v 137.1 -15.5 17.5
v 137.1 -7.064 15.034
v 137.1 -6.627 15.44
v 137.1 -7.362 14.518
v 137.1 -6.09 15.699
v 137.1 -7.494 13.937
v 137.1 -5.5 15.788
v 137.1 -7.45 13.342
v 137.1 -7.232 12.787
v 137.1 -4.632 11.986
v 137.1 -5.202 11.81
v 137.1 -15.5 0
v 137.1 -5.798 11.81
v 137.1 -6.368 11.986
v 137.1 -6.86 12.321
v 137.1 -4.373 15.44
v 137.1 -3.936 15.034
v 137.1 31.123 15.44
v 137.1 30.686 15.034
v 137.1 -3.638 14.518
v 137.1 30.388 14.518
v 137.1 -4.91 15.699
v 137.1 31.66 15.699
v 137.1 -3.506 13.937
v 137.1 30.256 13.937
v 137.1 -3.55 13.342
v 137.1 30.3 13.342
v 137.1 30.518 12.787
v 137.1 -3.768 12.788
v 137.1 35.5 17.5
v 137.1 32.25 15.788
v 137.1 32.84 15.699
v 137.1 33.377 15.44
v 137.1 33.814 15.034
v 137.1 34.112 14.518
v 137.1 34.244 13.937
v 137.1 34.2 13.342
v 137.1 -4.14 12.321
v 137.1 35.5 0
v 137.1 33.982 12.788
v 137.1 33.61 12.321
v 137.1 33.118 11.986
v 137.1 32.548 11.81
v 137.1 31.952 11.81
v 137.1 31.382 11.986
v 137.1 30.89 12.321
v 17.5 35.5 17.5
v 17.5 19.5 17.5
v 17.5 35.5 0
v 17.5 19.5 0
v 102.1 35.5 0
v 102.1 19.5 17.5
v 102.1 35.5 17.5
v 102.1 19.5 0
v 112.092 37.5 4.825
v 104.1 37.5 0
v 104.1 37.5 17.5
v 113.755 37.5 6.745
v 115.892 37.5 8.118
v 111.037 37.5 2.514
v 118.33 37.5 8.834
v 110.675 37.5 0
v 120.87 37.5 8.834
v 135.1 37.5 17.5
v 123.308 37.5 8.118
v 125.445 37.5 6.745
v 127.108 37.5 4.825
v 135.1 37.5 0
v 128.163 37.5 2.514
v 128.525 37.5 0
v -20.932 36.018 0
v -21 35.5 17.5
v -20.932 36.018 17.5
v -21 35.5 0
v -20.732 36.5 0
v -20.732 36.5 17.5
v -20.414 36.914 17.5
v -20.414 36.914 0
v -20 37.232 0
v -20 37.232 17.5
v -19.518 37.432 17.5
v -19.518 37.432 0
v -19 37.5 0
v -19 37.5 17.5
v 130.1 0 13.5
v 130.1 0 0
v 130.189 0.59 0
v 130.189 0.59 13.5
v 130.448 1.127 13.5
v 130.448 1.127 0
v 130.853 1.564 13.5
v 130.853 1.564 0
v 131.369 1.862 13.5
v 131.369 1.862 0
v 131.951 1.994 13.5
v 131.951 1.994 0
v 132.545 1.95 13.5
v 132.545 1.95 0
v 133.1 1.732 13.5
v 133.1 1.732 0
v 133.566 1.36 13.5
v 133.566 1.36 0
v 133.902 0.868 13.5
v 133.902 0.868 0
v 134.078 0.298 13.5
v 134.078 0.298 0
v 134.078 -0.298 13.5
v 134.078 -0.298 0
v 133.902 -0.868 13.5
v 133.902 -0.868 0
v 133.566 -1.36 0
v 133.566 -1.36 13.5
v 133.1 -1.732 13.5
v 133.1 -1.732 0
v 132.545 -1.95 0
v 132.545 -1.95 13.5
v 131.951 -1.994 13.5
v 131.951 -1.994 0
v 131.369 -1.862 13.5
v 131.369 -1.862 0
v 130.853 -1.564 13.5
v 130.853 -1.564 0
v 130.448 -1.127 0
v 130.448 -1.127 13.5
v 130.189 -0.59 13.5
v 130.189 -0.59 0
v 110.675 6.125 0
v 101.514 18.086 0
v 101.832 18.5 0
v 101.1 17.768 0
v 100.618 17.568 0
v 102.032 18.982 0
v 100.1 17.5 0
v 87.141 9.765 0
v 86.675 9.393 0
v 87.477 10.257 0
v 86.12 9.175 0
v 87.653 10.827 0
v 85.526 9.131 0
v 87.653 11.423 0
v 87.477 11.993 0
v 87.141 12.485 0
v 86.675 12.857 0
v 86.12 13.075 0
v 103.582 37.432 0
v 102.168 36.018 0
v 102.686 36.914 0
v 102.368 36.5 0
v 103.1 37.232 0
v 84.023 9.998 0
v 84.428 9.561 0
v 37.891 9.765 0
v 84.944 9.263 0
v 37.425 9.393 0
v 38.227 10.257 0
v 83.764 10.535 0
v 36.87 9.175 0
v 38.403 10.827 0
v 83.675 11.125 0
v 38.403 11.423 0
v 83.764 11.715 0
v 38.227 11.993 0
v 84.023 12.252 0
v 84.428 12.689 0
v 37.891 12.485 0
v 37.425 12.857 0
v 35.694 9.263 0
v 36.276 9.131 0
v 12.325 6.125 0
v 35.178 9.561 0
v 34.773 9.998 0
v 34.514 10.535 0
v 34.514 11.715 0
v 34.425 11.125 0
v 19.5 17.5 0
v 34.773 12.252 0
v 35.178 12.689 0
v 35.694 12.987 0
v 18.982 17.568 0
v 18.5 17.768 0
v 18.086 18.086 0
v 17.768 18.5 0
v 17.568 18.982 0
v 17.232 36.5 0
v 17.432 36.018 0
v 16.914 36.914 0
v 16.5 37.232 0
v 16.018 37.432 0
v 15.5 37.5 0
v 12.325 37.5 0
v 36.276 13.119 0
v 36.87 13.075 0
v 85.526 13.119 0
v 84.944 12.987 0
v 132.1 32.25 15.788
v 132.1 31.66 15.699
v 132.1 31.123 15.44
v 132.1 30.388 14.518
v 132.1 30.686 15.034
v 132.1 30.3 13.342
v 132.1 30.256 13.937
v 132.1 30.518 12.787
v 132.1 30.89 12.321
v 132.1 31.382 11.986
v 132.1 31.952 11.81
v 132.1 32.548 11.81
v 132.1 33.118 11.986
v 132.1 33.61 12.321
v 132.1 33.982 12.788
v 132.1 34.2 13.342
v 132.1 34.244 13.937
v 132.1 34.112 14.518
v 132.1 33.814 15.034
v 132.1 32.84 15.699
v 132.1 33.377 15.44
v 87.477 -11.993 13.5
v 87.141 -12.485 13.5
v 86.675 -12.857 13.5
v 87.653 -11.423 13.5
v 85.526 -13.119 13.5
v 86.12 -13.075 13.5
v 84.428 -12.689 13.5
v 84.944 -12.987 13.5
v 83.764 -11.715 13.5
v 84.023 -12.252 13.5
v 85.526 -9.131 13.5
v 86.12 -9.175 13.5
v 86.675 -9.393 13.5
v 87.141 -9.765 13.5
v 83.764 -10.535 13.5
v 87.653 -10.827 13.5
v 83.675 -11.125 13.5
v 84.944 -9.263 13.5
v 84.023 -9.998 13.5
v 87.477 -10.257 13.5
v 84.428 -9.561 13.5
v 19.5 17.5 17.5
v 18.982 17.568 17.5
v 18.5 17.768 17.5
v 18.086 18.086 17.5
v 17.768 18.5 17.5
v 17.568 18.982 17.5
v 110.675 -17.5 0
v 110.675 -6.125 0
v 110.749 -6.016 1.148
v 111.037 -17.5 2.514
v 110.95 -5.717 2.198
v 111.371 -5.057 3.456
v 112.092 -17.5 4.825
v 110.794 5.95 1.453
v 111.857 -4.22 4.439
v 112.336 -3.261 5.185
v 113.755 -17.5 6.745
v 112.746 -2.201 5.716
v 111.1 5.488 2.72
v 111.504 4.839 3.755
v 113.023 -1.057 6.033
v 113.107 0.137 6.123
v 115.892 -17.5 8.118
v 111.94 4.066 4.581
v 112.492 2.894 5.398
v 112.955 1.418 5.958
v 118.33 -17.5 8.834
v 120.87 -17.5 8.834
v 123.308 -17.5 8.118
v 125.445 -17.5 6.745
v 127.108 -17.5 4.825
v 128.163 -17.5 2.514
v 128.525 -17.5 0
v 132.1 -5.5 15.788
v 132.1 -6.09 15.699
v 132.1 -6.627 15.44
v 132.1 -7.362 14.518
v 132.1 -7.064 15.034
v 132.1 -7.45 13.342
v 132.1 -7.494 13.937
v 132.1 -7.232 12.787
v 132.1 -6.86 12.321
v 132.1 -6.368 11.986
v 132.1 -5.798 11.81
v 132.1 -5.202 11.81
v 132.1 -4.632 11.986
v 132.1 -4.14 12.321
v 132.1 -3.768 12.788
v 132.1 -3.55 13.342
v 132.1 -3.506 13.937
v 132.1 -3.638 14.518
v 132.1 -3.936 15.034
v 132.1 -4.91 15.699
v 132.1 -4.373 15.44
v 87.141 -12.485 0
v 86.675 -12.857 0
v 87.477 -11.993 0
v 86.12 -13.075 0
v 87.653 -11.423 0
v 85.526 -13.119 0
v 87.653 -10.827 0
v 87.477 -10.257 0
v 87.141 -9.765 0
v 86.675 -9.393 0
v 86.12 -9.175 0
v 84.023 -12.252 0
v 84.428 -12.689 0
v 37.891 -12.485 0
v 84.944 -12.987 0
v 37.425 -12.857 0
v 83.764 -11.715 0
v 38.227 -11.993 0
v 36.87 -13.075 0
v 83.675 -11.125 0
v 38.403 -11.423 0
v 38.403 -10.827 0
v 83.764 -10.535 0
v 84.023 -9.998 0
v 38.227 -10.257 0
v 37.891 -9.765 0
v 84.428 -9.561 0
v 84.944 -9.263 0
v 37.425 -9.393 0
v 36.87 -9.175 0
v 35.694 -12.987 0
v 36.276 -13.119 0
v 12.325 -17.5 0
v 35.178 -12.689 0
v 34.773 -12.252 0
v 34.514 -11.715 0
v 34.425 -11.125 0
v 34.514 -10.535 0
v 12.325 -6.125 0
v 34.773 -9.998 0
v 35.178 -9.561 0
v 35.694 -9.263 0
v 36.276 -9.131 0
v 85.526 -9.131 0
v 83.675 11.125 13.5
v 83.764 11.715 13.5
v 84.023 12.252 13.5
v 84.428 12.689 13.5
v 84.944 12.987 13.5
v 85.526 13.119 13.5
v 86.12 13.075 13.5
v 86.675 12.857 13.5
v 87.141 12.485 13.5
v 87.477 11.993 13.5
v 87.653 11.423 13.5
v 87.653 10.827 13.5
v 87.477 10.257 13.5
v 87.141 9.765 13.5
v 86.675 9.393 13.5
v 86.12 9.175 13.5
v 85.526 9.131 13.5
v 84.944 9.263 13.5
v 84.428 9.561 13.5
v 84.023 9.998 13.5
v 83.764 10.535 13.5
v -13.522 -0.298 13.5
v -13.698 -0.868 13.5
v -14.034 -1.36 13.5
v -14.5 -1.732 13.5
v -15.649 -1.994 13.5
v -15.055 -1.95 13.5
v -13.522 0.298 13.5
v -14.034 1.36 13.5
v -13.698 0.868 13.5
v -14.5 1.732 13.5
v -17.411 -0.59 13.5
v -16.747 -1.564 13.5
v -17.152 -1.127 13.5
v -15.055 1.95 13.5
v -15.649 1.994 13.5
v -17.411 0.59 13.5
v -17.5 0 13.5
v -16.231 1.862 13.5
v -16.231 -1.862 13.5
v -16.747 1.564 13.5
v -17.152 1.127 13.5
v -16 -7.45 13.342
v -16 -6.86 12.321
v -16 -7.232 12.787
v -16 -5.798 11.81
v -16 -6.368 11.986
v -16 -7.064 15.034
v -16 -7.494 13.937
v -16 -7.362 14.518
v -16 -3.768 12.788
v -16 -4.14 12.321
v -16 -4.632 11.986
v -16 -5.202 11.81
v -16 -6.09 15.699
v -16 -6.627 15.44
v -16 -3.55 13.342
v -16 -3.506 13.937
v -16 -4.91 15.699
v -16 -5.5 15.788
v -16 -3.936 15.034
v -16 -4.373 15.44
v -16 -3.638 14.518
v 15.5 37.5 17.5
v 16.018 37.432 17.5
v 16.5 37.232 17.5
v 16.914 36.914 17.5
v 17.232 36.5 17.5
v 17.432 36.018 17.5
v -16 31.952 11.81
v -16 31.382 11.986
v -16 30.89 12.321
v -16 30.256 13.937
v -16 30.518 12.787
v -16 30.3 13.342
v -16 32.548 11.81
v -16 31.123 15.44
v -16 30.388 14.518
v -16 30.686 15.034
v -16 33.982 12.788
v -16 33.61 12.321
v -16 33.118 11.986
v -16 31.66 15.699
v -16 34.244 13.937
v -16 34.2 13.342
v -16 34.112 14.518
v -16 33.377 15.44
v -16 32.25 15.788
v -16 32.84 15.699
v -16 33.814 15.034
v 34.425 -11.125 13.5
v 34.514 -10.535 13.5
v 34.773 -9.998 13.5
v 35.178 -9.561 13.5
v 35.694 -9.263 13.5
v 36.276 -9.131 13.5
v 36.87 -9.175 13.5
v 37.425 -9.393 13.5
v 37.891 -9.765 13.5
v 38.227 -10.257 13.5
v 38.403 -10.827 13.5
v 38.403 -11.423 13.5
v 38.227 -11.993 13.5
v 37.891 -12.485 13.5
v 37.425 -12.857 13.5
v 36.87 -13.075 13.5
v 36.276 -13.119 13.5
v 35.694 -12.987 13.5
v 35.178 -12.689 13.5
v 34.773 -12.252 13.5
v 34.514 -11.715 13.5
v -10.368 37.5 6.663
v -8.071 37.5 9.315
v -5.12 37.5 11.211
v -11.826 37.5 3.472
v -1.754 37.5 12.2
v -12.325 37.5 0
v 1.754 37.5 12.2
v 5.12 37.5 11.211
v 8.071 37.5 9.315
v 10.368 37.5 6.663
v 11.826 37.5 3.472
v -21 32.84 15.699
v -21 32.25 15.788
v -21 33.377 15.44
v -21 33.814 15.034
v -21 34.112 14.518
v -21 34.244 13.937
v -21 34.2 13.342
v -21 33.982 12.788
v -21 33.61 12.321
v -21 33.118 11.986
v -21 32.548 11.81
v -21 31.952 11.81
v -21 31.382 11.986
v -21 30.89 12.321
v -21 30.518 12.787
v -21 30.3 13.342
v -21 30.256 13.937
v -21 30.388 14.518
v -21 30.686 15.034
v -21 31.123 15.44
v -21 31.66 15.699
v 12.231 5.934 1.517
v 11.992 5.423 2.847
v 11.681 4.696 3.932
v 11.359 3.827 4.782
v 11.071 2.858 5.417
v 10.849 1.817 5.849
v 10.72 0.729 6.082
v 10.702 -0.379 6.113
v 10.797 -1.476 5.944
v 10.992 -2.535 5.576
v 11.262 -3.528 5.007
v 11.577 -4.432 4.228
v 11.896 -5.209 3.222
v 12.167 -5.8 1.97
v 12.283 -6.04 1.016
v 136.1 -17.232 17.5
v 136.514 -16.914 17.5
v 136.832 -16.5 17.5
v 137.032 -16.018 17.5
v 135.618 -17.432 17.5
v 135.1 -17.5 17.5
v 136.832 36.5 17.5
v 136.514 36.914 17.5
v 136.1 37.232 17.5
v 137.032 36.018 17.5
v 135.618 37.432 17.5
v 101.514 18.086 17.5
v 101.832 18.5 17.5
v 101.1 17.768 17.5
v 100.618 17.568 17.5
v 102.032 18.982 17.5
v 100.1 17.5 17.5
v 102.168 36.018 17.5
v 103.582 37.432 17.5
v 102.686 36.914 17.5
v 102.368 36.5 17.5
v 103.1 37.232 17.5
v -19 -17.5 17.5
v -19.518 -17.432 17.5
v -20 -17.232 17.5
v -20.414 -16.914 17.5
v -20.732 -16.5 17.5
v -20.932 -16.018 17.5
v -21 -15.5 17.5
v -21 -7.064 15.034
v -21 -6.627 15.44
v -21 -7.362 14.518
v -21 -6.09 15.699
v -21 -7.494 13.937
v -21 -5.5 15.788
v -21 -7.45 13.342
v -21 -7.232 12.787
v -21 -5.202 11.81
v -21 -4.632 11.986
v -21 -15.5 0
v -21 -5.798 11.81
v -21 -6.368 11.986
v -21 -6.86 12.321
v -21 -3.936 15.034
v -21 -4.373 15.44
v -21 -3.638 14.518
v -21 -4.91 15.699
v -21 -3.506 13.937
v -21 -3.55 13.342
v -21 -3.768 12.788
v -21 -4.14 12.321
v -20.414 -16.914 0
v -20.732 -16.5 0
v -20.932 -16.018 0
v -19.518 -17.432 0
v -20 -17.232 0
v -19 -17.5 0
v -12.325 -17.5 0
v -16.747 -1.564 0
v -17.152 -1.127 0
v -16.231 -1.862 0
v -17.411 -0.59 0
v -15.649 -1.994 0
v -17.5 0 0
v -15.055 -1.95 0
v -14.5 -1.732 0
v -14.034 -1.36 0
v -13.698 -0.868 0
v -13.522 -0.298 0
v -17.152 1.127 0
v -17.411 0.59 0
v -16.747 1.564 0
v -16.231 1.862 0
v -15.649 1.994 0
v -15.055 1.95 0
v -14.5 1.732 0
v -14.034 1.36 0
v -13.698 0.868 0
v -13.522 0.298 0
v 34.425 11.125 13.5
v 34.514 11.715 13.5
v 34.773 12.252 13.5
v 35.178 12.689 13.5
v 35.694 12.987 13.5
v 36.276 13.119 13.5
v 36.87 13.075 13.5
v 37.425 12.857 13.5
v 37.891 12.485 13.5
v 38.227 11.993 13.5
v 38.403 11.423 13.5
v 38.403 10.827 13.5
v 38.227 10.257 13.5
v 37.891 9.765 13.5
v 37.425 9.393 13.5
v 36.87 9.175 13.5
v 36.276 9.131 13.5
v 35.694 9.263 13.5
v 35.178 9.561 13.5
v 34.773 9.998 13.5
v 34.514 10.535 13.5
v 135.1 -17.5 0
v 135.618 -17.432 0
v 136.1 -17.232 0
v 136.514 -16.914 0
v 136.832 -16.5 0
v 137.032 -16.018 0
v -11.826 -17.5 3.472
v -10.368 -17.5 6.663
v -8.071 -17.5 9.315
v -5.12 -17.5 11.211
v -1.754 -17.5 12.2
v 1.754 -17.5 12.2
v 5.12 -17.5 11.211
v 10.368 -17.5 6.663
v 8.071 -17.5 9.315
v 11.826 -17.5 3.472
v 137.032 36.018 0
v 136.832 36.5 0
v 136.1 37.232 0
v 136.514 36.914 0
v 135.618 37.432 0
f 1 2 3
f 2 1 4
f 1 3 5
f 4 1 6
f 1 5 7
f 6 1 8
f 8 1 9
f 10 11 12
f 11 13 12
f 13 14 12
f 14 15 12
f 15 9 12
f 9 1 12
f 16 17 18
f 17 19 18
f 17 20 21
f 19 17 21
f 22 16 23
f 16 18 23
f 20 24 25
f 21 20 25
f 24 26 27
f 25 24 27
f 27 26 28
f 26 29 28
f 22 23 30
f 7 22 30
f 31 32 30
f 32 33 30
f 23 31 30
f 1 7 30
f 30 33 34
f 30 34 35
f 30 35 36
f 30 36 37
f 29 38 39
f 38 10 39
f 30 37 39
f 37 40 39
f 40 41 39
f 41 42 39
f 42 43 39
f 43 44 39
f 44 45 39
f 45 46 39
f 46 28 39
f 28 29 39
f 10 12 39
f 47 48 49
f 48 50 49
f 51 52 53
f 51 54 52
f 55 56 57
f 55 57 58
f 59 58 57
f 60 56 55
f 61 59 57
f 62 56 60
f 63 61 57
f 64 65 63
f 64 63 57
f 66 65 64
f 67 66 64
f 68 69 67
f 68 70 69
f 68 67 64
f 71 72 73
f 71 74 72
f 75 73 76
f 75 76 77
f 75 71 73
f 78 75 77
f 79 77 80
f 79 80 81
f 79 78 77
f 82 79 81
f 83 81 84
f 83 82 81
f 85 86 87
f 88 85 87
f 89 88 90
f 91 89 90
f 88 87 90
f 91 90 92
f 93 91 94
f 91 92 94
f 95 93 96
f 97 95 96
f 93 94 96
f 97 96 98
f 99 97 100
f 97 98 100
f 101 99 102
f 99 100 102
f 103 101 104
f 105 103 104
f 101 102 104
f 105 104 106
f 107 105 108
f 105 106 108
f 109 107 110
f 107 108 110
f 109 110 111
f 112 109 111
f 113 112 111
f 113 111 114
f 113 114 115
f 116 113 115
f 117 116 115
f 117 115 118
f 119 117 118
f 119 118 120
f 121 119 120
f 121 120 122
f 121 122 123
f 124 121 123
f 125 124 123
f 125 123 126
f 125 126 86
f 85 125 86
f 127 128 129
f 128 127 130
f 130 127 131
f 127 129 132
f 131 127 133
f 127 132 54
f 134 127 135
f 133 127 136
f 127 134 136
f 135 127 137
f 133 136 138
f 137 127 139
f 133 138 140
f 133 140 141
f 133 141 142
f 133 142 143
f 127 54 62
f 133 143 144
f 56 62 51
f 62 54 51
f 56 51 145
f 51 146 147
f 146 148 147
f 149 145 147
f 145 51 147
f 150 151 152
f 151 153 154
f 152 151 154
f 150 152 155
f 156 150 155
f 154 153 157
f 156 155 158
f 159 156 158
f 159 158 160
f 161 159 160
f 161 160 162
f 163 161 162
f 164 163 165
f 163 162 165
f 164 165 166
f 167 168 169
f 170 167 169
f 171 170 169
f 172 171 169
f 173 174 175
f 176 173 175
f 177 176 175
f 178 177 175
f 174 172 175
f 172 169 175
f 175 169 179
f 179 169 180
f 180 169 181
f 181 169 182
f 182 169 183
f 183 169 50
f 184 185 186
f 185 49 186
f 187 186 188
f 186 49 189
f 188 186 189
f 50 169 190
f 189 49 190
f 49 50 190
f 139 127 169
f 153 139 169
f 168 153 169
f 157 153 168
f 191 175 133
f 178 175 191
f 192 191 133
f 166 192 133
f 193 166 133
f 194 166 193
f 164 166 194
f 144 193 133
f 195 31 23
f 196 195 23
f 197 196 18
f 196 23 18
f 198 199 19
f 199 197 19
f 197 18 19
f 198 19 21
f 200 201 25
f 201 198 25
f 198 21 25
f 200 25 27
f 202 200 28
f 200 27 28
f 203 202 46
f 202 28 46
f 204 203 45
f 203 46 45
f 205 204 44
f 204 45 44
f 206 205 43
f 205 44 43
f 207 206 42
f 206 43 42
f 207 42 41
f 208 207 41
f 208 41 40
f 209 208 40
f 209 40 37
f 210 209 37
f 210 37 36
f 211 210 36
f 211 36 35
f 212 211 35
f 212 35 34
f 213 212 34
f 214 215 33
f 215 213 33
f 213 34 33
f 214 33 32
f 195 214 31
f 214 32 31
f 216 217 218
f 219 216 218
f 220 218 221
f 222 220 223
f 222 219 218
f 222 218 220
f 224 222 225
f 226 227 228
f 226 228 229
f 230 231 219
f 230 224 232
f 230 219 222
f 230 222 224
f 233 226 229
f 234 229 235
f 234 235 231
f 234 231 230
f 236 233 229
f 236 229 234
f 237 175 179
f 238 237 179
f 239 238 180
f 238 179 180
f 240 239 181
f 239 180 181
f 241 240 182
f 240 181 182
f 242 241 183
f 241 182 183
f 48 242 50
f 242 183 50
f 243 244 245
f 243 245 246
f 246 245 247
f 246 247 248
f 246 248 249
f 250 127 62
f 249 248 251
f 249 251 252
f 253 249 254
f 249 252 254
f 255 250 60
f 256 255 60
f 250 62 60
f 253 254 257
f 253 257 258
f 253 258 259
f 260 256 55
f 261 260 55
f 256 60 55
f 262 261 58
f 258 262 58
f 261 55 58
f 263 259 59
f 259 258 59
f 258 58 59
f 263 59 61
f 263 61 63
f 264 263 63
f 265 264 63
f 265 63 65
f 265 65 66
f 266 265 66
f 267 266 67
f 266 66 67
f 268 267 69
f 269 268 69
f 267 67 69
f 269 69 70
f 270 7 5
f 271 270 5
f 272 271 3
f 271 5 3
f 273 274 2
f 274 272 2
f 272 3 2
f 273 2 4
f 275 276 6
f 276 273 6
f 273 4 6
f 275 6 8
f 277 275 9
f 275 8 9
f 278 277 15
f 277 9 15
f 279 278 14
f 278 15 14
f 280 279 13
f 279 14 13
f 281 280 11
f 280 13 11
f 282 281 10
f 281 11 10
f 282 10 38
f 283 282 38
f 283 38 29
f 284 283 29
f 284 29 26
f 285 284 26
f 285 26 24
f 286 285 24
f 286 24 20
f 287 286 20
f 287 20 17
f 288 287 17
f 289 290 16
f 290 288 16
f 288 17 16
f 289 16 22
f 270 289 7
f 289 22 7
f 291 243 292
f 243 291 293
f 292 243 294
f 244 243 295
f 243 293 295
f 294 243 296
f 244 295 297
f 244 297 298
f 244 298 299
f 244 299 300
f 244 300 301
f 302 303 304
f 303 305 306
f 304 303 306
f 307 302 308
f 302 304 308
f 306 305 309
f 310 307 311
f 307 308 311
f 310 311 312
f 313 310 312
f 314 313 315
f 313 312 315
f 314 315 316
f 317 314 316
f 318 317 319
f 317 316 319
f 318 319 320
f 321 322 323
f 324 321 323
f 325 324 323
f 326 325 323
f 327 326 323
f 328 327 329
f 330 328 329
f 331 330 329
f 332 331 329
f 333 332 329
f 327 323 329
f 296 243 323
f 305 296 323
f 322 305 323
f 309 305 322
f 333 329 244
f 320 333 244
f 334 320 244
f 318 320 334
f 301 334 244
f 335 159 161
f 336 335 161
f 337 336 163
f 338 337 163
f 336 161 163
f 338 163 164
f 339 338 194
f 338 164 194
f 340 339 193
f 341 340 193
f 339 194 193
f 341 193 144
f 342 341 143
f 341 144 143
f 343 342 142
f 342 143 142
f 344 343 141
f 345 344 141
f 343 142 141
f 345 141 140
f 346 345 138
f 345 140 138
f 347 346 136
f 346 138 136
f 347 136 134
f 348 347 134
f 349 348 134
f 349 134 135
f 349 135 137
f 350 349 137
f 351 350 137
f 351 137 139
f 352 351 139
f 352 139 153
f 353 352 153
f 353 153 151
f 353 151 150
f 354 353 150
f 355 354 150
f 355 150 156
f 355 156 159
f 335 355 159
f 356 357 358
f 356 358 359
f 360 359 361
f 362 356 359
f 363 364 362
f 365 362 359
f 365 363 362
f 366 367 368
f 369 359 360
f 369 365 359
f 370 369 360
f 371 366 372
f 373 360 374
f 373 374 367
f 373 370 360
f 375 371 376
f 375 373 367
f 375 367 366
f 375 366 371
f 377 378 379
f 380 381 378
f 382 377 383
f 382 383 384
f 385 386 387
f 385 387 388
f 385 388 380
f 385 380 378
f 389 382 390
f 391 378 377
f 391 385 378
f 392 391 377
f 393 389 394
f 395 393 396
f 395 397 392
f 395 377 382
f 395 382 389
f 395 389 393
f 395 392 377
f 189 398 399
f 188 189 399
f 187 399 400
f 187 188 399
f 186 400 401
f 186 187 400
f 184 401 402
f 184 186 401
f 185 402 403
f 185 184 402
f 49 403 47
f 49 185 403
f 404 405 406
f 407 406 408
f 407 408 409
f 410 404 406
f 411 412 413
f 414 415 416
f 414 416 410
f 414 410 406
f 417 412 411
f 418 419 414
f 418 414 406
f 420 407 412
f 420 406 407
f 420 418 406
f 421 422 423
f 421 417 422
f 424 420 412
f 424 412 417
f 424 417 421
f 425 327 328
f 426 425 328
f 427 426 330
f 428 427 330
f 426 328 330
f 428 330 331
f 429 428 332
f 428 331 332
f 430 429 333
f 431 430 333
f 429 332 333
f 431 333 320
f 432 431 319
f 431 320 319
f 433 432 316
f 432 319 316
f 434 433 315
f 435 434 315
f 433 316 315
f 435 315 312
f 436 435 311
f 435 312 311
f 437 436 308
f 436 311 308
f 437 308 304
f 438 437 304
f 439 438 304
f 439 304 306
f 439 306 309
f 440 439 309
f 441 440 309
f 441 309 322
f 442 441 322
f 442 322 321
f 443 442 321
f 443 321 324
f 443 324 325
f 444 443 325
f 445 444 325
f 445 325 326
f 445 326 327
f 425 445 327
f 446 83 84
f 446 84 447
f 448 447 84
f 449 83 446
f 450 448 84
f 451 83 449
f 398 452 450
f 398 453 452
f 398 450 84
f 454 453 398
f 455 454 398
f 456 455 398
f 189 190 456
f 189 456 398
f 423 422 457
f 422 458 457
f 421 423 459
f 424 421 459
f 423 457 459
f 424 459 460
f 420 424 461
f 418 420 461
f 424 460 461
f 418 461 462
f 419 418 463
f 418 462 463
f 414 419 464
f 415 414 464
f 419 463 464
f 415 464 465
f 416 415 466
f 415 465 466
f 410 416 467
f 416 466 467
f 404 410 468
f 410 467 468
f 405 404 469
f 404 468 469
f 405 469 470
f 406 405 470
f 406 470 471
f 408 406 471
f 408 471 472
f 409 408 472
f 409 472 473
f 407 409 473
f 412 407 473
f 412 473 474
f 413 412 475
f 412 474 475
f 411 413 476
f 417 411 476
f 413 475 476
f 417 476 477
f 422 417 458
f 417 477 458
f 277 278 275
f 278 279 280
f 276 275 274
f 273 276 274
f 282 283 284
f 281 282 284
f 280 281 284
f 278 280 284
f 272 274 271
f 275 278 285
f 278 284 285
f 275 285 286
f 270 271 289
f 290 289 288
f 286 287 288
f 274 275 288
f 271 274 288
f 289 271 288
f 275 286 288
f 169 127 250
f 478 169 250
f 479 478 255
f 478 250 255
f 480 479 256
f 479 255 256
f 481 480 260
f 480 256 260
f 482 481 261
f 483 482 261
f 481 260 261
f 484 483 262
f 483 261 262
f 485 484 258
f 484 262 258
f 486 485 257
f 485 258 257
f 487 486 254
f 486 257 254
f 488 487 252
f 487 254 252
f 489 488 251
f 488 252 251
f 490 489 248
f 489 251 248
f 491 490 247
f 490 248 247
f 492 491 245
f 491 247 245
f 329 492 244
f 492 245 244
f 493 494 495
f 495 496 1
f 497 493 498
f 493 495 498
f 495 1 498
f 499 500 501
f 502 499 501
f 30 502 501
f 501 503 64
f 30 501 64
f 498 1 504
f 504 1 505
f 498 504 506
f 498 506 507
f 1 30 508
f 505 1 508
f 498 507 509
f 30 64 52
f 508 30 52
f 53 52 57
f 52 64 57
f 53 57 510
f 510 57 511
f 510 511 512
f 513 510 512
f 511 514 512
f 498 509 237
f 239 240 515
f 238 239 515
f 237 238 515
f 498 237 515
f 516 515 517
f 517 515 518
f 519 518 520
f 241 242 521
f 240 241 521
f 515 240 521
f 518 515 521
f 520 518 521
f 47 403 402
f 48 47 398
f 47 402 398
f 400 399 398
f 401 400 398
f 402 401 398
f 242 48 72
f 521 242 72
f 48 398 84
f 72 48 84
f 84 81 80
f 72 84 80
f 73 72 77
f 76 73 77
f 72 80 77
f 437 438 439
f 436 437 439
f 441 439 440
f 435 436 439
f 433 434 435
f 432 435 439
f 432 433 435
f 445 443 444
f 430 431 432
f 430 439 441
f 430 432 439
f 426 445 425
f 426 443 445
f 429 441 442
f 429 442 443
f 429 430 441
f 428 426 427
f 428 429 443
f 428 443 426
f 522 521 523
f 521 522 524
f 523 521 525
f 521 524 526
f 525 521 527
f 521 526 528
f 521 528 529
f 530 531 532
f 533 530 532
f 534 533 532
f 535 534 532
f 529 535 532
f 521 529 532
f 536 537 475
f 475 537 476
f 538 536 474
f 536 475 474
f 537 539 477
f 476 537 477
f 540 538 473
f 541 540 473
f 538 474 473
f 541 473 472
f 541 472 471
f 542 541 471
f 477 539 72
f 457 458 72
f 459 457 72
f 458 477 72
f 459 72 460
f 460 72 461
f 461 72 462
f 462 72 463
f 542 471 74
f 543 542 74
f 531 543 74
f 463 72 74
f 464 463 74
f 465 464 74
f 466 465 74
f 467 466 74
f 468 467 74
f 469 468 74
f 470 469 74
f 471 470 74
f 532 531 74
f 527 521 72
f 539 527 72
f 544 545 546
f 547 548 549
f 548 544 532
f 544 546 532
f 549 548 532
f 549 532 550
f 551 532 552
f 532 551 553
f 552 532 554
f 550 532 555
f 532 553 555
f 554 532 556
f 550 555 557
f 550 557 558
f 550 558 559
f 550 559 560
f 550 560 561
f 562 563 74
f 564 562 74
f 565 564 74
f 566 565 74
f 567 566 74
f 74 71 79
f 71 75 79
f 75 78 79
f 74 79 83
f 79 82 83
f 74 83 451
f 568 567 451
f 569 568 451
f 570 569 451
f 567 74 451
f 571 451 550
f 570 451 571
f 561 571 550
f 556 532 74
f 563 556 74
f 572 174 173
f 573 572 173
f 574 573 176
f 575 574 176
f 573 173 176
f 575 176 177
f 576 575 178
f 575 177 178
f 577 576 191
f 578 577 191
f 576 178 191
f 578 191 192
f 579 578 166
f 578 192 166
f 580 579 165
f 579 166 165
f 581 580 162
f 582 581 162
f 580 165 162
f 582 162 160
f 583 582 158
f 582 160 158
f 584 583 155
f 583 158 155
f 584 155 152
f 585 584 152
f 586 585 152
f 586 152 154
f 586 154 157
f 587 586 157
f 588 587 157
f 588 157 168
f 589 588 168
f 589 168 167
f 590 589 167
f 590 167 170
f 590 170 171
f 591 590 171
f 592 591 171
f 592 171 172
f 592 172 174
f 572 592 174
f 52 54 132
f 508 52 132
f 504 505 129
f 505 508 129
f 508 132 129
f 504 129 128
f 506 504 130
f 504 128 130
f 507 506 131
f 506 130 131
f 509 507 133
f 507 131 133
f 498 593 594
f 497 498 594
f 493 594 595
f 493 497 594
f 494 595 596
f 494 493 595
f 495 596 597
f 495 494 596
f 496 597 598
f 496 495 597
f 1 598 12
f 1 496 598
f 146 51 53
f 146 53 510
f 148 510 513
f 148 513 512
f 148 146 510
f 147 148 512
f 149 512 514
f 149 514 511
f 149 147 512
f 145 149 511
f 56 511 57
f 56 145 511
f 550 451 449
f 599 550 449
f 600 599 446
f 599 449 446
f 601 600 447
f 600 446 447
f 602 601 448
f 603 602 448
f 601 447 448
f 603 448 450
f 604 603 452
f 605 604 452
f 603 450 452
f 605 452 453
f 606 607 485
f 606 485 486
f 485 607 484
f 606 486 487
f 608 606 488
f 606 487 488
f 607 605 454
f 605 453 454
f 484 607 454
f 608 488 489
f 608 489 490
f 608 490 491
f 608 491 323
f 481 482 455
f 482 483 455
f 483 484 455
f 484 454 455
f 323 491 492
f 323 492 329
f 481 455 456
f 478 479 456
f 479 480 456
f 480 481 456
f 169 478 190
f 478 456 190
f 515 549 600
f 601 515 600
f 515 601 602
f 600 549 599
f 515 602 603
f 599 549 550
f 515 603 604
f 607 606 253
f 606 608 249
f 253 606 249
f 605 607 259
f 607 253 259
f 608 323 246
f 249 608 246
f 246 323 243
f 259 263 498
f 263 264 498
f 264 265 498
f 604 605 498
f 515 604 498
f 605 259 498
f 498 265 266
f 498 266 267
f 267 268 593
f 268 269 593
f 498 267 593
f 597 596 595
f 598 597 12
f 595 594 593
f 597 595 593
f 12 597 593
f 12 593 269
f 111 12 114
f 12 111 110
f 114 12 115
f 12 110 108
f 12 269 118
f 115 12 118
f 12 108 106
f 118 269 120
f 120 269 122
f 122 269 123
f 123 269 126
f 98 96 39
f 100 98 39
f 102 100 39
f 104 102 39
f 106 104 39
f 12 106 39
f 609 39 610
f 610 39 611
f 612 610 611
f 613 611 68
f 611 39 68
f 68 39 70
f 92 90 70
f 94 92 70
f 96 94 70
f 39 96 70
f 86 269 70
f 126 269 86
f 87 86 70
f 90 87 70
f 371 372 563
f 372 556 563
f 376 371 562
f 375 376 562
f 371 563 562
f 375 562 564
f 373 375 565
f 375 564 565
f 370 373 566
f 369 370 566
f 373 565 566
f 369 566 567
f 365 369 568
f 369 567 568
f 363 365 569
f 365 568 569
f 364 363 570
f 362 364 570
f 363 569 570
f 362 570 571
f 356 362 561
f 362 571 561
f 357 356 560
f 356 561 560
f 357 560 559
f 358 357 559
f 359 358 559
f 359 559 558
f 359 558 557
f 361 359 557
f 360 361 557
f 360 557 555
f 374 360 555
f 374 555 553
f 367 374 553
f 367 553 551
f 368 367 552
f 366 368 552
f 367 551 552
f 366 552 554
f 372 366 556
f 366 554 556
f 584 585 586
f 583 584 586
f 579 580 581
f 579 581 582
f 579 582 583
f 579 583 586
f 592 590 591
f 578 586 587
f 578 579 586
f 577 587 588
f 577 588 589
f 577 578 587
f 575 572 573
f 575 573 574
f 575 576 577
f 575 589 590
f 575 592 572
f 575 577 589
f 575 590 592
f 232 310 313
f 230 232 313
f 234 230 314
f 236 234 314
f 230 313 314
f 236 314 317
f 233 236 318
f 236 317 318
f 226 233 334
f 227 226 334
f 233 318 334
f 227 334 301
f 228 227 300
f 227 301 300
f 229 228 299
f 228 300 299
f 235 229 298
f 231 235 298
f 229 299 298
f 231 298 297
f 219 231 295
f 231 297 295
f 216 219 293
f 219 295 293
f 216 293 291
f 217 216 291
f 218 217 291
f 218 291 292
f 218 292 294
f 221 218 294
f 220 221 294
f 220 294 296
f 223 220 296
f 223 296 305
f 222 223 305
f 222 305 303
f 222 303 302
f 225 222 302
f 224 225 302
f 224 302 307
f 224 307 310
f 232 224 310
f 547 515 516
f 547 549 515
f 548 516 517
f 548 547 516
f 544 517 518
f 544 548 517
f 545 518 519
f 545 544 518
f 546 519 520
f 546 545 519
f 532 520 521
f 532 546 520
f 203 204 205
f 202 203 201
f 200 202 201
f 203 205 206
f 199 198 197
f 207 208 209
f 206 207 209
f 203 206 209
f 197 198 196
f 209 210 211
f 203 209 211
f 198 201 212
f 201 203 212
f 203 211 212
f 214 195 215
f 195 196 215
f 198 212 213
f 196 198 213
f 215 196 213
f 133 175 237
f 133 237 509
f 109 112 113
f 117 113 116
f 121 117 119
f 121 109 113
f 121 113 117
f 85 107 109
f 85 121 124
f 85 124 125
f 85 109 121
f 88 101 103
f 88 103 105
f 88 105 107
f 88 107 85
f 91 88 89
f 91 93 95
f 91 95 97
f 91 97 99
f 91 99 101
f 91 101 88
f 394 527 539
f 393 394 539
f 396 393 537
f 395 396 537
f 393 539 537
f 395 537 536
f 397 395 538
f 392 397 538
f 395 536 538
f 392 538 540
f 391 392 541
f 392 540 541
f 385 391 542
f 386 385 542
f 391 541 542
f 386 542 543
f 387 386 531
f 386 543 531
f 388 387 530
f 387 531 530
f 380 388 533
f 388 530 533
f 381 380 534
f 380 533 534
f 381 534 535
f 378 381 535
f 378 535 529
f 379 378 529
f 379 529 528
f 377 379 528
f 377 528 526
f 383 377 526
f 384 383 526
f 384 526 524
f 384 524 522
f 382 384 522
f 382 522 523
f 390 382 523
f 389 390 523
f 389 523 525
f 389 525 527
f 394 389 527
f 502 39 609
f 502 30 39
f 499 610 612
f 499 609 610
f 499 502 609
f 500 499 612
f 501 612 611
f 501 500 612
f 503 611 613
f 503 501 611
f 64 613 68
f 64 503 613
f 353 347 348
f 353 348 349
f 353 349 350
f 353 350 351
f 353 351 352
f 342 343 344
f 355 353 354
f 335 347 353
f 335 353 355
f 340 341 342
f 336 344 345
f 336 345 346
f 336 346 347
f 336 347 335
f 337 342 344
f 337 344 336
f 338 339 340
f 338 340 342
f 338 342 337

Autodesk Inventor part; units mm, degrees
ref_plane "YZ Plane" through (0, 0, 0) normal (1, 0, 0) x (0, 1, 0)
ref_plane "XZ Plane" through (0, 0, 0) normal (0, 1, 0) x (-1, 0, 0)
ref_plane "XY Plane" through (0, 0, 0) normal (0, 0, 1) x (1, 0, 0)
sketch "Sketch1" plane through (0, 0, 0) normal (0, 0, 1) x (1, 0, 0)
  line L0 (0, 0) -> (119.6, 0)
  line L1 (119.6, 0) -> (119.6, 150)
  line L2 (119.6, 150) -> (0, 150)
  line L3 (0, 150) -> (0, 0)
  dimension "d0" = 119.6
  dimension "d1" = 150
sketch "Sketch2" plane through (0, 0, 0) normal (1, 0, 0) x (0, 1, 0)
  circle A0 centre (0, 0) radius 12.5
  circle A1 centre (0, 0) radius 6.125
  line L0 (-12.5, 0) -> (12.5, 0)
  line L1 (12.5, 0) -> (12.5, 12.5)
  line L2 (12.5, 12.5) -> (-12.5, 12.5)
  line L3 (-12.5, 12.5) -> (-12.5, 0)
  circle A2 centre (150, 0) radius 12.5
  circle A3 centre (150, 0) radius 6.125
  line L4 (137.5, 0) -> (162.5, 0)
  line L5 (162.5, 0) -> (162.5, 12.5)
  line L6 (162.5, 12.5) -> (137.5, 12.5)
  line L7 (137.5, 12.5) -> (137.5, 0)
  line L8 (-12.5, 12.5) -> (-17.5, 12.5)
  line L9 (-17.5, 12.5) -> (-17.5, 0)
  line L10 (-17.5, 0) -> (-12.5, 0)
  line L11 (-12.5, 0) -> (-12.5, 12.5)
  line L12 (12.5, 12.5) -> (17.5, 12.5)
  line L13 (17.5, 12.5) -> (17.5, 0)
  line L14 (17.5, 0) -> (12.5, 0)
  line L15 (12.5, 0) -> (12.5, 12.5)
  point P0 (6.125, 0)
  point P1 (-6.125, 0)
  point P2 (150, 0)
  point P3 (12.5, 0)
  dimension "d2" = 25
  dimension "d3" = 12.25
  dimension "d6" = 5
  dimension "d7" = 5
  dimension "d8" = 35
extrude "Extrusion1" add sketch "Sketch2" along normal up to surface (119.6 mm away) contours L3 L2 A0 | A0 L0 A1 | L10 L9 L8 L3 | A0 L2 L1 | L1 L12 L13 L14 | A1 L0 picked at (10.2705, 0.9272) picked at (1.5282, 2.3311)
ref_plane "Work Plane1" through (59.8, 0, 0) normal (-1, 0, 0) x (0, 0, 1)
sketch "Sketch3" plane through (0, -17.5, 0) normal (0, -1, 0) x (1, 0, 0)
  line L0 (0, 12.5) -> (119.6, 12.5) projected
  line L1 (102.1, 12.5) -> (137.1, 12.5)
  line L2 (137.1, 12.5) -> (137.1, 0)
  line L3 (137.1, 0) -> (102.1, 0)
  line L4 (102.1, 0) -> (102.1, 12.5)
  line L5 (119.6, 12.5) -> (119.6, 0) projected
  circle A0 centre (119.6, 0) radius 8.925
  point P0 (0, 0)
  point P1 (119.6, 12.5)
  point P2 (128.525, 0)
  point P3 (110.675, 0)
  dimension "d9" = 35
  dimension "d33" = 17.85
extrude "Extrusion2" add sketch "Sketch3" against normal blind 55 contours L0 L5 A0 L3 L4 | L1 L2 L3 A0 L5 | A0 L3 L5 | L5 L3 A0
extrude "Extrusion4" cut sketch "Sketch3" along normal through all both and the other way through all contours A0 L3 L5 | L5 L3 A0
extrude "Extrusion3" cut sketch "Sketch2" along normal up to surface (119.6 mm away) contours A1 L0 picked at (1.5282, 2.3311)
mirror "Mirror1" about plane through (59.8, 0, 0) normal (-1, 0, 0) of "Extrusion2", "Extrusion4", "Extrusion3"
sketch "Sketch4" plane through (102.1, 17.5, 12.5) normal (0, 0, 1) x (1, 0, 0)
  line L0 (-119.6, -35) -> (35, -35) projected
  line L1 (0, 20) -> (35, 20) projected
  line L2 (0, 0) -> (0, 20) projected
  line L3 (-84.6, 0) -> (0, 0) projected
  line L4 (-84.6, 0) -> (-84.6, 20) projected
  line L5 (-84.6, 20) -> (-119.6, 20) projected
  line L6 (35, -35) -> (35, 20) projected
  line L7 (-119.6, -35) -> (-119.6, 20) projected
  point P0 (-102.1, -17.5)
extrude "Extrusion5" add sketch "Sketch4" along normal blind 5
sketch "Sketch5" plane through (102.1, 17.5, 0) normal (0, 0, -1) x (-1, 0, 0)
  circle A0 centre (16.425, -6.375) radius 2
  line L0 (-8.575, -11.375) -> (93.175, -11.375) projected
  line L1 (-8.575, 20) -> (-8.575, -11.375) projected
  circle A1 centre (65.675, -6.375) radius 2
  circle A2 centre (16.425, -28.625) radius 2
  circle A3 centre (65.675, -28.625) radius 2
  line L2 (93.175, -35) -> (93.175, -23.625) projected
  line L3 (93.175, -23.625) -> (-8.575, -23.625) projected
  circle A4 centre (-30, -17.5) radius 2
  circle A5 centre (117.6, -17.5) radius 2
  line L4 (-35, -35) -> (-35, 20) projected
  line L5 (119.6, -35) -> (119.6, 20) projected
  line L6 (16.425, -6.375) -> (16.425, -28.625) construction
  point P0 (102.1, -17.5)
  point P1 (16.425, -17.5)
  dimension "d18" = 4
  dimension "d19" = 5
  dimension "d20" = 25
  dimension "d23" = 49.25
  dimension "d26" = 22.25
  dimension "d29" = 27.5
  dimension "d30" = 5
  dimension "d38" = 5
  dimension "d39" = 2
extrude "Extrusion6" cut sketch "Sketch5" against normal blind 13.5
sketch "Sketch6" plane through (0, 37.5, 0) normal (0, 1, 0) x (1, 0, 0)
  circle A0 centre (0, 0) radius 12.325
  line L0 (-17.5, 0) -> (-17.5, -17.5) projected
  line L1 (-17.5, -17.5) -> (-21, -17.5)
  line L2 (-21, -17.5) -> (-21, 0)
  line L3 (-21, 0) -> (-17.5, 0)
  line L4 (-17.5, 0) -> (-17.5, -17.5)
  line L5 (-17.5, 0) -> (-8.925, 0) projected
  dimension "d34" = 24.65
  dimension "d40" = 3.5
extrude "Extrusion7" cut sketch "Sketch6" against normal through all contours A0
extrude "Extrusion8" add sketch "Sketch6" against normal up to surface (55 mm away) contours L0 L1 L2 L3
fillet "Fillet1" radius 2 8 edges at (102.1, 17.5, 8.75) (17.5, 17.5, 8.75) (17.5, 37.5, 8.75) (102.1, 37.5, 8.75) (137.1, 37.5, 8.75) (137.1, -17.5, 8.75) (-21, 37.5, 8.75) (-21, -17.5, 8.75)
sketch "Sketch7" plane through (-21, -15.5, 17.5) normal (-1, 0, 0) x (0, 0, 1)
  circle A0 centre (-3.7125, 10) radius 2
  line L0 (0, 51) -> (0, 0) projected
  line L1 (-17.5, -2) -> (0, -2) projected
  circle A1 centre (-3.7125, 47.75) radius 2
  point P0 (-17.5, 15.5)
  dimension "d43" = 4
  dimension "d44" = 3.7125
  dimension "d45" = 12
  dimension "d49" = 37.75
extrude "Extrusion9" cut sketch "Sketch7" against normal blind 5
extrude "Extrusion10" cut sketch "Sketch7" along normal blind 5 from surface at -158.1
equation "\"d7\" = d6"
equation "\"d9\" = d8"
properties part number "BottomBase"
